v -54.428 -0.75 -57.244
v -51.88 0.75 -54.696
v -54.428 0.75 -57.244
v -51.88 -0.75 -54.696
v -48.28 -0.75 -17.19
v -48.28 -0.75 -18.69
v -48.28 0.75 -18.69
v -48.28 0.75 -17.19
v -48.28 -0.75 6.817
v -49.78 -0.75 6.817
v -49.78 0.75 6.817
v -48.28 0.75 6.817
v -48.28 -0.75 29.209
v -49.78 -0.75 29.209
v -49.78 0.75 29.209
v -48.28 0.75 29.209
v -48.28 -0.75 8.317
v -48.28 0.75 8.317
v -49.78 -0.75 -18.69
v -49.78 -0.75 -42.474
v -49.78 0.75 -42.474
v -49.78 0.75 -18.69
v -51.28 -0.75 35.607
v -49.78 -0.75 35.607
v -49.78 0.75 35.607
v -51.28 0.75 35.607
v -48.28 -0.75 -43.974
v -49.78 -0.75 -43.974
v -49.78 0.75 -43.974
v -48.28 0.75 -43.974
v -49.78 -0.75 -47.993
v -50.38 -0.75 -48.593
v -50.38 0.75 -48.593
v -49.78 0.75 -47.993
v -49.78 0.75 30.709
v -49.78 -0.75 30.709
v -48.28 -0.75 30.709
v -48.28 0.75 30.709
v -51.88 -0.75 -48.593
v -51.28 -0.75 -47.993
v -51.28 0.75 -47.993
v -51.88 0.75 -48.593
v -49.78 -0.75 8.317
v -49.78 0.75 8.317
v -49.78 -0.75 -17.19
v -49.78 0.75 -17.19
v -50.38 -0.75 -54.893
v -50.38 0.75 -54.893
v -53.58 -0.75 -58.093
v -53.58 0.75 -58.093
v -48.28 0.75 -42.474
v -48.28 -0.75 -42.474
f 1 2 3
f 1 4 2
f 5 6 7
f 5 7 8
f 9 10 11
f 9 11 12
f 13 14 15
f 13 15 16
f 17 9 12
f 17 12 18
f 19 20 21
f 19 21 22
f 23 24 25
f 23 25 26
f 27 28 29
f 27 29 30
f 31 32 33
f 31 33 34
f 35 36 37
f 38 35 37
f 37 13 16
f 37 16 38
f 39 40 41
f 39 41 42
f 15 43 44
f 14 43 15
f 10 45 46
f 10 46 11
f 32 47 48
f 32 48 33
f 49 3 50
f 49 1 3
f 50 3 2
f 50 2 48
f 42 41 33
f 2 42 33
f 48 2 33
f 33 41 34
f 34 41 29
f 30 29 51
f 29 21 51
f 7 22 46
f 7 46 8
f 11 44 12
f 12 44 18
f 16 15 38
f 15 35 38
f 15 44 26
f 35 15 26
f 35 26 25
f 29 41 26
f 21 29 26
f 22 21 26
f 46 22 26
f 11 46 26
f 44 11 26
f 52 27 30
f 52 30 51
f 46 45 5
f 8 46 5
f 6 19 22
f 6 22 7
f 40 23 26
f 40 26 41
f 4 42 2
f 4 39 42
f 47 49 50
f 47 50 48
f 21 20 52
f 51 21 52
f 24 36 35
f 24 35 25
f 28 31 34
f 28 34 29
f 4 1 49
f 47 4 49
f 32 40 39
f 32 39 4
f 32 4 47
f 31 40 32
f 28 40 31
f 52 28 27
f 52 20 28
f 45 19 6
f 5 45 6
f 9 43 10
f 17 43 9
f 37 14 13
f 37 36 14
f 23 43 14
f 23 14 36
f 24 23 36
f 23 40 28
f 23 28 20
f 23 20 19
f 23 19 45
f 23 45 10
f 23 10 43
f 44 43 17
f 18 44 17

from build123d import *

# Parameters (mm, degrees)
F0_W     = 1.5
F0_H     = 1.5
F1_DEPTH = 0.75


with BuildPart() as f1:
    # F0 (on Front) → F1 (new body, symmetric)
    with BuildSketch(Plane.XZ):
        Polygon((-54.428298, -57.24404), (-53.57977, -58.092568), (-50.37977, -54.892568), (-50.37977, -48.592568), (-49.77977, -47.992568), (-49.77977, -43.974031), (-49.77977, -42.474031), (-49.77977, -18.689784), (-49.77977, -17.189784), (-49.77977, -13.796059), (-49.77977, -12.296059), (-49.77977, 6.816904), (-49.77977, 8.316904), (-49.77977, 29.209403), (-49.77977, 30.709403), (-49.77977, 35.607432), (-51.27977, 35.607432), (-51.27977, -47.992568), (-51.87977, -48.592568), (-51.87977, -54.695512), align=None)
        with Locations((-49.02977, -43.224031)):
            Rectangle(F0_W, F0_H)
        with Locations((-49.02977, -17.939784)):
            Rectangle(F0_W, F0_H)
        with Locations((-49.02977, 29.959403)):
            Rectangle(F0_W, F0_H)
        with Locations((-49.02977, 7.566904)):
            Rectangle(F0_W, F0_H)
    extrude(amount=F1_DEPTH, both=True)


solid = f1.part
